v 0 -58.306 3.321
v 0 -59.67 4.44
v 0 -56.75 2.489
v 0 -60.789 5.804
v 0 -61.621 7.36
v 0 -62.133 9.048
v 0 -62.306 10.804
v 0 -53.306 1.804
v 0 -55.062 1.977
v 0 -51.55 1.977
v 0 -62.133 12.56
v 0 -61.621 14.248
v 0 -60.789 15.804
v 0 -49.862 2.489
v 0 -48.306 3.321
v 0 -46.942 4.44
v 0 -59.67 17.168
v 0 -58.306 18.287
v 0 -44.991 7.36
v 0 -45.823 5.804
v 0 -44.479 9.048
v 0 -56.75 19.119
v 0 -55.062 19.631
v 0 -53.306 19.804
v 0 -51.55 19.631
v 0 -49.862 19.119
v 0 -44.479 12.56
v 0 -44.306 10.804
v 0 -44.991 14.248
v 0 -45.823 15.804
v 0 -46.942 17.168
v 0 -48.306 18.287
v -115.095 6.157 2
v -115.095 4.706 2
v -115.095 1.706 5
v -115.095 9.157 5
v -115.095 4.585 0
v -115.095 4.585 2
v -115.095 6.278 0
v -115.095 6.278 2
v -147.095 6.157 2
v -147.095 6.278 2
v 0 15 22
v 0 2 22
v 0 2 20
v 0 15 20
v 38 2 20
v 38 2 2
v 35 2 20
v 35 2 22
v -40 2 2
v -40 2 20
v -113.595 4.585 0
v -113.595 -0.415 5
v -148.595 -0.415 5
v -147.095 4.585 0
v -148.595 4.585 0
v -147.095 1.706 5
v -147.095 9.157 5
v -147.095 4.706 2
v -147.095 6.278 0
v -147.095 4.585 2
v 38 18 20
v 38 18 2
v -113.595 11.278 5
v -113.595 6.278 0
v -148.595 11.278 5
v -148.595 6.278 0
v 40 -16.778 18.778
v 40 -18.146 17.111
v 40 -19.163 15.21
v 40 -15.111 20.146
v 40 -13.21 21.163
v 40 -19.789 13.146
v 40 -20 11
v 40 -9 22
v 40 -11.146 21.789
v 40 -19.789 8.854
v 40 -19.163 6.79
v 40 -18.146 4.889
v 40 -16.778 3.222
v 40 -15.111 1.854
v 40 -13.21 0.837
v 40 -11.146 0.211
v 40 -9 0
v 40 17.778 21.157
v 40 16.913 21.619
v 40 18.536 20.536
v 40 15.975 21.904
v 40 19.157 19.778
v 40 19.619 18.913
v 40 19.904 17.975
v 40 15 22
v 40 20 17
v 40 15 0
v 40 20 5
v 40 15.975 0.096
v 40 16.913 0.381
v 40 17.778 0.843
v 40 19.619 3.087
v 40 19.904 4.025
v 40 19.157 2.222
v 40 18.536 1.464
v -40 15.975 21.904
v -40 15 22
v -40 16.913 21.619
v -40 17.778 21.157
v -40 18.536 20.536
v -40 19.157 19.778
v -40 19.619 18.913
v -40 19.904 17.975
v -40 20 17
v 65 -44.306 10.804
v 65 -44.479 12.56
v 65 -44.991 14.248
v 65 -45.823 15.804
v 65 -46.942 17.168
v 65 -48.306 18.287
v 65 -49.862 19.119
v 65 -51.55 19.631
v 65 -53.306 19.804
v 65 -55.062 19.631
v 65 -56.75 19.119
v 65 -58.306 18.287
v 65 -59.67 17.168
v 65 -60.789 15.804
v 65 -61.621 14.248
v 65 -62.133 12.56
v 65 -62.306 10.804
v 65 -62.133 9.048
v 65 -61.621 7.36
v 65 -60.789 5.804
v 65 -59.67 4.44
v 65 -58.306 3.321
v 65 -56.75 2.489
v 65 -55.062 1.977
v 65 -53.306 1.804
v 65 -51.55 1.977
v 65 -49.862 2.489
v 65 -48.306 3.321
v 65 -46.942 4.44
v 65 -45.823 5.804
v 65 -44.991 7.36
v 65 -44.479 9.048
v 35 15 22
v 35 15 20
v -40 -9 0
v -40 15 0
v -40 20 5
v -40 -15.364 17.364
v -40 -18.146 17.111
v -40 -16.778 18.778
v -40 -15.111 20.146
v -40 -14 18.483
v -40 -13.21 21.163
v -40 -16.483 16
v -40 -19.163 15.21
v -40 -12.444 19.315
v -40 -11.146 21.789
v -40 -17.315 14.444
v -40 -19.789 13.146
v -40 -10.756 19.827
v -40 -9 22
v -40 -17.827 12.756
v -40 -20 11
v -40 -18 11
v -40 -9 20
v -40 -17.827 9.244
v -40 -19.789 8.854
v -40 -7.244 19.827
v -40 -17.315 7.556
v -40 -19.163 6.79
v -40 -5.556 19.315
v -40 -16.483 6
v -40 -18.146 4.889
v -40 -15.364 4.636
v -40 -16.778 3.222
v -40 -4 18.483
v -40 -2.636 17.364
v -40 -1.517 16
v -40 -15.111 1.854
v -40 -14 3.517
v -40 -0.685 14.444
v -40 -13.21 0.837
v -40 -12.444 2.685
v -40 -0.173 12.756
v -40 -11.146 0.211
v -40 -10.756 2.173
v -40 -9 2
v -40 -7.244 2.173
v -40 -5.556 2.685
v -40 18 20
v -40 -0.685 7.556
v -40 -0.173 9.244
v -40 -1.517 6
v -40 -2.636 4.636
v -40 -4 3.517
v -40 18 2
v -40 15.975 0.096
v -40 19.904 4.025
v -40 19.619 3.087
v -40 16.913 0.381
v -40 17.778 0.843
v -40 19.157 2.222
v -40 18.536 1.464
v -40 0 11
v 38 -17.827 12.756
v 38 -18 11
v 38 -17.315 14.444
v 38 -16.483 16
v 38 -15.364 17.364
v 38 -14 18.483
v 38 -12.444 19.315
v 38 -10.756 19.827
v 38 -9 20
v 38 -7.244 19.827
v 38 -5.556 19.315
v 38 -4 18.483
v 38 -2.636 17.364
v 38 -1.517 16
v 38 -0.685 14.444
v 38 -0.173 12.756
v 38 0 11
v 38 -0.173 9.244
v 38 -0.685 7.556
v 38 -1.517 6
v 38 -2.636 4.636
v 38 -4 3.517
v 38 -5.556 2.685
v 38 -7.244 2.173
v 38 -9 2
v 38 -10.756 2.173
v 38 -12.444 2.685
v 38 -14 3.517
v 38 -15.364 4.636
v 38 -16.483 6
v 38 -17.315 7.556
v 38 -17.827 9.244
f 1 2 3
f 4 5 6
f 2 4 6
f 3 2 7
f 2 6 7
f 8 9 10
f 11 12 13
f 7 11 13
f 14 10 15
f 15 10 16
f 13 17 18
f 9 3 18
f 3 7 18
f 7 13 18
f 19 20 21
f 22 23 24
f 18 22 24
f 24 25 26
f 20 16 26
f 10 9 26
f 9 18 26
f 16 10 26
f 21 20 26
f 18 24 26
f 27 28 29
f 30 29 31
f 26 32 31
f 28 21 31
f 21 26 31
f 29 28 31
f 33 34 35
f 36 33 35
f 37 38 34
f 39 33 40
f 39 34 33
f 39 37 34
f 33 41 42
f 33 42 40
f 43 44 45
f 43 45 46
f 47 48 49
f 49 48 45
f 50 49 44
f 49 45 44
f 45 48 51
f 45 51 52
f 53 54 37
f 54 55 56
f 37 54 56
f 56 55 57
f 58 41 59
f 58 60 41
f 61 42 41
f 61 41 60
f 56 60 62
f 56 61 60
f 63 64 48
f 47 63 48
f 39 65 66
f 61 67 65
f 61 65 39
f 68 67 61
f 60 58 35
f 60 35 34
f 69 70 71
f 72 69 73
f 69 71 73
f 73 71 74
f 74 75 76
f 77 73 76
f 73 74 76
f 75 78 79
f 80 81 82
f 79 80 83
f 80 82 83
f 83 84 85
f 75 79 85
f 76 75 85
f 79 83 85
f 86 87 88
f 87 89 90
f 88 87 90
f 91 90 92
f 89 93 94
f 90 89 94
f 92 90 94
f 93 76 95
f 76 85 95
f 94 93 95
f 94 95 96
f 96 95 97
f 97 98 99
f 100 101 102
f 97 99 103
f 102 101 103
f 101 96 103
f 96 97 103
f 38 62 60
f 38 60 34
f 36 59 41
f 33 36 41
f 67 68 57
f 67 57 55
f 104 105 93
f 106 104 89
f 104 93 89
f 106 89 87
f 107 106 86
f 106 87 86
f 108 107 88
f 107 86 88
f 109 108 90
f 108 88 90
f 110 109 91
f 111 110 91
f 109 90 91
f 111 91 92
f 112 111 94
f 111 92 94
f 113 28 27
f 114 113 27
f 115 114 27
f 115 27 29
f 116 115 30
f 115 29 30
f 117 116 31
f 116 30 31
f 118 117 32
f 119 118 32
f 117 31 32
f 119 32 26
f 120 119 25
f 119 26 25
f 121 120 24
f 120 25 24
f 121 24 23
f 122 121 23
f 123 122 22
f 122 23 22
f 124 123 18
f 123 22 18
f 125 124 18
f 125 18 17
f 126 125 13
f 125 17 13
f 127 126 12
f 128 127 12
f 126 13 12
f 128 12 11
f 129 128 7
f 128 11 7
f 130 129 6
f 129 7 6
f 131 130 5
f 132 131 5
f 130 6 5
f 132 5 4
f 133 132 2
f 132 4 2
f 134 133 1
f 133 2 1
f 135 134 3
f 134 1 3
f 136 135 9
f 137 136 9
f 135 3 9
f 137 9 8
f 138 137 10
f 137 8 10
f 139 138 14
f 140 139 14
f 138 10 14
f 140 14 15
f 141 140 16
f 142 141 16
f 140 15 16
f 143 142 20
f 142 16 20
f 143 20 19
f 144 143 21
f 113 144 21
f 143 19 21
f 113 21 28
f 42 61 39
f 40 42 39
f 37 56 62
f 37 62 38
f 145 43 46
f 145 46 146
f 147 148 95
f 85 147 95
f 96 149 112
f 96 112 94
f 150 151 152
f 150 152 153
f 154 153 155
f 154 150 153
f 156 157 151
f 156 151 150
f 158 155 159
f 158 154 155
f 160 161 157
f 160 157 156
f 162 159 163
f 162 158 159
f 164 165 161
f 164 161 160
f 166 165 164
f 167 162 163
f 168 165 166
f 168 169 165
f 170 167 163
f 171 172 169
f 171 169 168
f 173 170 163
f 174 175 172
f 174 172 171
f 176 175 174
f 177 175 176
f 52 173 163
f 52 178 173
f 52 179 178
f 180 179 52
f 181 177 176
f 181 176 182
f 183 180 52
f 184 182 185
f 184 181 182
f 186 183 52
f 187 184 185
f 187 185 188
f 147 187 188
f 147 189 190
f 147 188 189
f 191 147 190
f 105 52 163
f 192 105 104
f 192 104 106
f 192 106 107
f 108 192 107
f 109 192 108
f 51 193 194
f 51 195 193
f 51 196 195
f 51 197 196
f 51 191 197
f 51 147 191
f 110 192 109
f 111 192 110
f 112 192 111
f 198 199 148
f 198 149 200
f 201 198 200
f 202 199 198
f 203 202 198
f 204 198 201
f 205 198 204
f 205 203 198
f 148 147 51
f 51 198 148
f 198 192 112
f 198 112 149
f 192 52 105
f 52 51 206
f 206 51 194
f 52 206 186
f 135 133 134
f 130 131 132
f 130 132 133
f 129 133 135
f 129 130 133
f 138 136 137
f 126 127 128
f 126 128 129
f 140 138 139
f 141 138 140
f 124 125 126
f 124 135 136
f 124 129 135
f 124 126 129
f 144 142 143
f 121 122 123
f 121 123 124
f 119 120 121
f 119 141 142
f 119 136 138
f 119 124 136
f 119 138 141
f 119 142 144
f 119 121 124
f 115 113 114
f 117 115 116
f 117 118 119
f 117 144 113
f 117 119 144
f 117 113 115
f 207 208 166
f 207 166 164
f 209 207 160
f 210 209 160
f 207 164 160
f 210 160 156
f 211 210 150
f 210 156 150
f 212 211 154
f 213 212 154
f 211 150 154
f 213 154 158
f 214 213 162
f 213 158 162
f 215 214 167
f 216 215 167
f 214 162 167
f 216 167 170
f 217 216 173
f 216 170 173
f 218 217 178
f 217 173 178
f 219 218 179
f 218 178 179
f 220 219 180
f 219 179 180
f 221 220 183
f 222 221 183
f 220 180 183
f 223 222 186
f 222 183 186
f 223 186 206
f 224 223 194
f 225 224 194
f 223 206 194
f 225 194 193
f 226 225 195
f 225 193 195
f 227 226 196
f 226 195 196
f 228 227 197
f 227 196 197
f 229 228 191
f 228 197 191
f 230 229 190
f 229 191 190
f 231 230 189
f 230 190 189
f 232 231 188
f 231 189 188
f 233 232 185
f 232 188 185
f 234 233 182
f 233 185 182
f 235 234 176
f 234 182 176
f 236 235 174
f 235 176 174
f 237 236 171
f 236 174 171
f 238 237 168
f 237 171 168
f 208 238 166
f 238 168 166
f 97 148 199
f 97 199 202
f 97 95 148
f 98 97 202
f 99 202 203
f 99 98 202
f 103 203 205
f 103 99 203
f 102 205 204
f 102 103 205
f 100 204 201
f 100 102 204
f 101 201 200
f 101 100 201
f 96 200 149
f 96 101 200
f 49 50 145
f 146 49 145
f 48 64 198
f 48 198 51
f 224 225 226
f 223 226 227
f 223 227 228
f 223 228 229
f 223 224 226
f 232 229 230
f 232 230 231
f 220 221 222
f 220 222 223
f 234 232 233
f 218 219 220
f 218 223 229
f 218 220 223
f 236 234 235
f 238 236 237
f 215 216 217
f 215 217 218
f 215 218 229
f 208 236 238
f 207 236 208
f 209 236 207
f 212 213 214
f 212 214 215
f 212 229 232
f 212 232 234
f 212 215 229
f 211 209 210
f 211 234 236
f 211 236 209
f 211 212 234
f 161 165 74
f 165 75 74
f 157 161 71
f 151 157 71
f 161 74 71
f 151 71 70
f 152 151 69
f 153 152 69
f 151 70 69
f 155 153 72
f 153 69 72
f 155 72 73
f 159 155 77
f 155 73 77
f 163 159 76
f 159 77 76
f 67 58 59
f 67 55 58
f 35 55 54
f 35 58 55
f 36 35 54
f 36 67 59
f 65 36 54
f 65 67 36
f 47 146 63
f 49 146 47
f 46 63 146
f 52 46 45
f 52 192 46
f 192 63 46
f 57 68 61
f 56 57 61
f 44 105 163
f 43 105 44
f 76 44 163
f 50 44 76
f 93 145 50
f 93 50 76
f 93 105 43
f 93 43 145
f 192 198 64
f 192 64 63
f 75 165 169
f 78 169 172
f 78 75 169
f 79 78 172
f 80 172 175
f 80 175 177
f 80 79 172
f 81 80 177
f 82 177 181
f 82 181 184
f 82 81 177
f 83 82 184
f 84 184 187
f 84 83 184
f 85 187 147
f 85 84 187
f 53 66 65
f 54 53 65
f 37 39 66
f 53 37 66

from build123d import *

# Parameters (mm, degrees)
F0_W        = 80
F0_H        = 40
F1_DEPTH    = 22
F2_R        = 10.99999
F3_W        = 35
F3_H        = 13
F4_DEPTH    = 2
F5_R        = 4.99999
F6_W        = 35
F6_H        = 11.8533317
F7_DEPTH    = 5
F8_T1_DEPTH = 61.1282991577
F9_T        = -1.5
F10_W       = 32
F10_H       = 1.6933317
F11_DEPTH   = 2
F12_R       = 9
F13_DEPTH   = 65
F14_R       = 9
F15_DEPTH   = 78
F16_W       = 16
F16_H       = 18
F17_DEPTH   = 78


# Not quite as in the source:
# - a fillet or chamfer that OpenCascade refuses, or shapes differently, is made with other operations: its cross-section is extruded or revolved along the edge and cut away or added
# - a fillet or chamfer is up to 0.001 mm smaller than in the source, because OpenCascade refuses the exact size


with BuildPart() as f1:
    # F0 (on Top) → F1 (new body)
    with BuildSketch(Plane.XY):
        Rectangle(F0_W, F0_H)
    extrude(amount=F1_DEPTH)

    # F2 (radius 11 in the source; OpenCascade refuses exactly that, so slightly less here)
    f2_edges = [f1.edges().sort_by_distance(p)[0] for p in [
        (0, -20, 22),
        (0, -20, 0),
    ]]
    fillet(f2_edges, radius=F2_R)

    # F3 (on face) → F4 (cut)
    with BuildSketch(Plane.XY.offset(22)):
        with Locations((17.5, 8.5)):
            Rectangle(F3_W, F3_H)
    extrude(amount=-F4_DEPTH, mode=Mode.SUBTRACT)

    # F5 (radius 5 in the source; OpenCascade refuses exactly that, so slightly less here)
    f5_edges = [f1.edges().sort_by_distance(p)[0] for p in [
        (0, 20, 22),
        (0, 20, 0),
    ]]
    fillet(f5_edges, radius=F5_R)

    # F14 (on face) → F15 (cut)
    with BuildSketch(Plane(origin=(-40, 0, 0), x_dir=(0, -1, 0), z_dir=(-1, 0, 0))):
        with Locations((9, 11)):
            Circle(F14_R)
    extrude(amount=-F15_DEPTH, mode=Mode.SUBTRACT)

    # F16 (on face) → F17 (cut)
    with BuildSketch(Plane(origin=(-40, 0, 0), x_dir=(0, -1, 0), z_dir=(-1, 0, 0))):
        with Locations((-10, 11)):
            Rectangle(F16_W, F16_H)
    extrude(amount=-F17_DEPTH, mode=Mode.SUBTRACT)


with BuildPart() as f7:
    # F6 (on Top) → F7 (new body)
    with BuildSketch(Plane.XY):
        with Locations((-131.0947090387, 5.4316394962)):
            Rectangle(F6_W, F6_H)
    extrude(amount=F7_DEPTH)

    # F8: chamfer of 5.08 on 2 edges, made by hand

    # F8_s2 → F8_t1 (cut)
    with BuildSketch(Plane.YZ.offset(-161.6588586176)):
        Polygon((-0.4950263537, 5.08), (4.5849736463, 0), (-0.4950263537, 0), align=None)
        Polygon((11.3583053462, 5.08), (6.2783053462, 0), (11.3583053462, 0), align=None)
    extrude(amount=F8_T1_DEPTH, mode=Mode.SUBTRACT)

    # F9
    f9_openings = [f7.faces().sort_by_distance(p)[0] for p in [
        (-131.094709, 5.431639, 5),
    ]]
    offset(amount=F9_T, openings=f9_openings, kind=Kind.INTERSECTION)

    # F10 (on face) → F11 (cut)
    with BuildSketch(Plane(origin=(0, 0, 0), x_dir=(1, 0, 0), z_dir=(0, 0, -1))):
        with Locations((-131.0947090387, -5.4316394962)):
            Rectangle(F10_W, F10_H)
    extrude(amount=-F11_DEPTH, mode=Mode.SUBTRACT)


with BuildPart() as f13:
    # F12 (on Right) → F13 (new body)
    with BuildSketch(Plane.YZ):
        with Locations((-53.3060245216, 10.8038987964)):
            Circle(F12_R)
    extrude(amount=F13_DEPTH)


solid = Compound([f1.part, f7.part, f13.part])
